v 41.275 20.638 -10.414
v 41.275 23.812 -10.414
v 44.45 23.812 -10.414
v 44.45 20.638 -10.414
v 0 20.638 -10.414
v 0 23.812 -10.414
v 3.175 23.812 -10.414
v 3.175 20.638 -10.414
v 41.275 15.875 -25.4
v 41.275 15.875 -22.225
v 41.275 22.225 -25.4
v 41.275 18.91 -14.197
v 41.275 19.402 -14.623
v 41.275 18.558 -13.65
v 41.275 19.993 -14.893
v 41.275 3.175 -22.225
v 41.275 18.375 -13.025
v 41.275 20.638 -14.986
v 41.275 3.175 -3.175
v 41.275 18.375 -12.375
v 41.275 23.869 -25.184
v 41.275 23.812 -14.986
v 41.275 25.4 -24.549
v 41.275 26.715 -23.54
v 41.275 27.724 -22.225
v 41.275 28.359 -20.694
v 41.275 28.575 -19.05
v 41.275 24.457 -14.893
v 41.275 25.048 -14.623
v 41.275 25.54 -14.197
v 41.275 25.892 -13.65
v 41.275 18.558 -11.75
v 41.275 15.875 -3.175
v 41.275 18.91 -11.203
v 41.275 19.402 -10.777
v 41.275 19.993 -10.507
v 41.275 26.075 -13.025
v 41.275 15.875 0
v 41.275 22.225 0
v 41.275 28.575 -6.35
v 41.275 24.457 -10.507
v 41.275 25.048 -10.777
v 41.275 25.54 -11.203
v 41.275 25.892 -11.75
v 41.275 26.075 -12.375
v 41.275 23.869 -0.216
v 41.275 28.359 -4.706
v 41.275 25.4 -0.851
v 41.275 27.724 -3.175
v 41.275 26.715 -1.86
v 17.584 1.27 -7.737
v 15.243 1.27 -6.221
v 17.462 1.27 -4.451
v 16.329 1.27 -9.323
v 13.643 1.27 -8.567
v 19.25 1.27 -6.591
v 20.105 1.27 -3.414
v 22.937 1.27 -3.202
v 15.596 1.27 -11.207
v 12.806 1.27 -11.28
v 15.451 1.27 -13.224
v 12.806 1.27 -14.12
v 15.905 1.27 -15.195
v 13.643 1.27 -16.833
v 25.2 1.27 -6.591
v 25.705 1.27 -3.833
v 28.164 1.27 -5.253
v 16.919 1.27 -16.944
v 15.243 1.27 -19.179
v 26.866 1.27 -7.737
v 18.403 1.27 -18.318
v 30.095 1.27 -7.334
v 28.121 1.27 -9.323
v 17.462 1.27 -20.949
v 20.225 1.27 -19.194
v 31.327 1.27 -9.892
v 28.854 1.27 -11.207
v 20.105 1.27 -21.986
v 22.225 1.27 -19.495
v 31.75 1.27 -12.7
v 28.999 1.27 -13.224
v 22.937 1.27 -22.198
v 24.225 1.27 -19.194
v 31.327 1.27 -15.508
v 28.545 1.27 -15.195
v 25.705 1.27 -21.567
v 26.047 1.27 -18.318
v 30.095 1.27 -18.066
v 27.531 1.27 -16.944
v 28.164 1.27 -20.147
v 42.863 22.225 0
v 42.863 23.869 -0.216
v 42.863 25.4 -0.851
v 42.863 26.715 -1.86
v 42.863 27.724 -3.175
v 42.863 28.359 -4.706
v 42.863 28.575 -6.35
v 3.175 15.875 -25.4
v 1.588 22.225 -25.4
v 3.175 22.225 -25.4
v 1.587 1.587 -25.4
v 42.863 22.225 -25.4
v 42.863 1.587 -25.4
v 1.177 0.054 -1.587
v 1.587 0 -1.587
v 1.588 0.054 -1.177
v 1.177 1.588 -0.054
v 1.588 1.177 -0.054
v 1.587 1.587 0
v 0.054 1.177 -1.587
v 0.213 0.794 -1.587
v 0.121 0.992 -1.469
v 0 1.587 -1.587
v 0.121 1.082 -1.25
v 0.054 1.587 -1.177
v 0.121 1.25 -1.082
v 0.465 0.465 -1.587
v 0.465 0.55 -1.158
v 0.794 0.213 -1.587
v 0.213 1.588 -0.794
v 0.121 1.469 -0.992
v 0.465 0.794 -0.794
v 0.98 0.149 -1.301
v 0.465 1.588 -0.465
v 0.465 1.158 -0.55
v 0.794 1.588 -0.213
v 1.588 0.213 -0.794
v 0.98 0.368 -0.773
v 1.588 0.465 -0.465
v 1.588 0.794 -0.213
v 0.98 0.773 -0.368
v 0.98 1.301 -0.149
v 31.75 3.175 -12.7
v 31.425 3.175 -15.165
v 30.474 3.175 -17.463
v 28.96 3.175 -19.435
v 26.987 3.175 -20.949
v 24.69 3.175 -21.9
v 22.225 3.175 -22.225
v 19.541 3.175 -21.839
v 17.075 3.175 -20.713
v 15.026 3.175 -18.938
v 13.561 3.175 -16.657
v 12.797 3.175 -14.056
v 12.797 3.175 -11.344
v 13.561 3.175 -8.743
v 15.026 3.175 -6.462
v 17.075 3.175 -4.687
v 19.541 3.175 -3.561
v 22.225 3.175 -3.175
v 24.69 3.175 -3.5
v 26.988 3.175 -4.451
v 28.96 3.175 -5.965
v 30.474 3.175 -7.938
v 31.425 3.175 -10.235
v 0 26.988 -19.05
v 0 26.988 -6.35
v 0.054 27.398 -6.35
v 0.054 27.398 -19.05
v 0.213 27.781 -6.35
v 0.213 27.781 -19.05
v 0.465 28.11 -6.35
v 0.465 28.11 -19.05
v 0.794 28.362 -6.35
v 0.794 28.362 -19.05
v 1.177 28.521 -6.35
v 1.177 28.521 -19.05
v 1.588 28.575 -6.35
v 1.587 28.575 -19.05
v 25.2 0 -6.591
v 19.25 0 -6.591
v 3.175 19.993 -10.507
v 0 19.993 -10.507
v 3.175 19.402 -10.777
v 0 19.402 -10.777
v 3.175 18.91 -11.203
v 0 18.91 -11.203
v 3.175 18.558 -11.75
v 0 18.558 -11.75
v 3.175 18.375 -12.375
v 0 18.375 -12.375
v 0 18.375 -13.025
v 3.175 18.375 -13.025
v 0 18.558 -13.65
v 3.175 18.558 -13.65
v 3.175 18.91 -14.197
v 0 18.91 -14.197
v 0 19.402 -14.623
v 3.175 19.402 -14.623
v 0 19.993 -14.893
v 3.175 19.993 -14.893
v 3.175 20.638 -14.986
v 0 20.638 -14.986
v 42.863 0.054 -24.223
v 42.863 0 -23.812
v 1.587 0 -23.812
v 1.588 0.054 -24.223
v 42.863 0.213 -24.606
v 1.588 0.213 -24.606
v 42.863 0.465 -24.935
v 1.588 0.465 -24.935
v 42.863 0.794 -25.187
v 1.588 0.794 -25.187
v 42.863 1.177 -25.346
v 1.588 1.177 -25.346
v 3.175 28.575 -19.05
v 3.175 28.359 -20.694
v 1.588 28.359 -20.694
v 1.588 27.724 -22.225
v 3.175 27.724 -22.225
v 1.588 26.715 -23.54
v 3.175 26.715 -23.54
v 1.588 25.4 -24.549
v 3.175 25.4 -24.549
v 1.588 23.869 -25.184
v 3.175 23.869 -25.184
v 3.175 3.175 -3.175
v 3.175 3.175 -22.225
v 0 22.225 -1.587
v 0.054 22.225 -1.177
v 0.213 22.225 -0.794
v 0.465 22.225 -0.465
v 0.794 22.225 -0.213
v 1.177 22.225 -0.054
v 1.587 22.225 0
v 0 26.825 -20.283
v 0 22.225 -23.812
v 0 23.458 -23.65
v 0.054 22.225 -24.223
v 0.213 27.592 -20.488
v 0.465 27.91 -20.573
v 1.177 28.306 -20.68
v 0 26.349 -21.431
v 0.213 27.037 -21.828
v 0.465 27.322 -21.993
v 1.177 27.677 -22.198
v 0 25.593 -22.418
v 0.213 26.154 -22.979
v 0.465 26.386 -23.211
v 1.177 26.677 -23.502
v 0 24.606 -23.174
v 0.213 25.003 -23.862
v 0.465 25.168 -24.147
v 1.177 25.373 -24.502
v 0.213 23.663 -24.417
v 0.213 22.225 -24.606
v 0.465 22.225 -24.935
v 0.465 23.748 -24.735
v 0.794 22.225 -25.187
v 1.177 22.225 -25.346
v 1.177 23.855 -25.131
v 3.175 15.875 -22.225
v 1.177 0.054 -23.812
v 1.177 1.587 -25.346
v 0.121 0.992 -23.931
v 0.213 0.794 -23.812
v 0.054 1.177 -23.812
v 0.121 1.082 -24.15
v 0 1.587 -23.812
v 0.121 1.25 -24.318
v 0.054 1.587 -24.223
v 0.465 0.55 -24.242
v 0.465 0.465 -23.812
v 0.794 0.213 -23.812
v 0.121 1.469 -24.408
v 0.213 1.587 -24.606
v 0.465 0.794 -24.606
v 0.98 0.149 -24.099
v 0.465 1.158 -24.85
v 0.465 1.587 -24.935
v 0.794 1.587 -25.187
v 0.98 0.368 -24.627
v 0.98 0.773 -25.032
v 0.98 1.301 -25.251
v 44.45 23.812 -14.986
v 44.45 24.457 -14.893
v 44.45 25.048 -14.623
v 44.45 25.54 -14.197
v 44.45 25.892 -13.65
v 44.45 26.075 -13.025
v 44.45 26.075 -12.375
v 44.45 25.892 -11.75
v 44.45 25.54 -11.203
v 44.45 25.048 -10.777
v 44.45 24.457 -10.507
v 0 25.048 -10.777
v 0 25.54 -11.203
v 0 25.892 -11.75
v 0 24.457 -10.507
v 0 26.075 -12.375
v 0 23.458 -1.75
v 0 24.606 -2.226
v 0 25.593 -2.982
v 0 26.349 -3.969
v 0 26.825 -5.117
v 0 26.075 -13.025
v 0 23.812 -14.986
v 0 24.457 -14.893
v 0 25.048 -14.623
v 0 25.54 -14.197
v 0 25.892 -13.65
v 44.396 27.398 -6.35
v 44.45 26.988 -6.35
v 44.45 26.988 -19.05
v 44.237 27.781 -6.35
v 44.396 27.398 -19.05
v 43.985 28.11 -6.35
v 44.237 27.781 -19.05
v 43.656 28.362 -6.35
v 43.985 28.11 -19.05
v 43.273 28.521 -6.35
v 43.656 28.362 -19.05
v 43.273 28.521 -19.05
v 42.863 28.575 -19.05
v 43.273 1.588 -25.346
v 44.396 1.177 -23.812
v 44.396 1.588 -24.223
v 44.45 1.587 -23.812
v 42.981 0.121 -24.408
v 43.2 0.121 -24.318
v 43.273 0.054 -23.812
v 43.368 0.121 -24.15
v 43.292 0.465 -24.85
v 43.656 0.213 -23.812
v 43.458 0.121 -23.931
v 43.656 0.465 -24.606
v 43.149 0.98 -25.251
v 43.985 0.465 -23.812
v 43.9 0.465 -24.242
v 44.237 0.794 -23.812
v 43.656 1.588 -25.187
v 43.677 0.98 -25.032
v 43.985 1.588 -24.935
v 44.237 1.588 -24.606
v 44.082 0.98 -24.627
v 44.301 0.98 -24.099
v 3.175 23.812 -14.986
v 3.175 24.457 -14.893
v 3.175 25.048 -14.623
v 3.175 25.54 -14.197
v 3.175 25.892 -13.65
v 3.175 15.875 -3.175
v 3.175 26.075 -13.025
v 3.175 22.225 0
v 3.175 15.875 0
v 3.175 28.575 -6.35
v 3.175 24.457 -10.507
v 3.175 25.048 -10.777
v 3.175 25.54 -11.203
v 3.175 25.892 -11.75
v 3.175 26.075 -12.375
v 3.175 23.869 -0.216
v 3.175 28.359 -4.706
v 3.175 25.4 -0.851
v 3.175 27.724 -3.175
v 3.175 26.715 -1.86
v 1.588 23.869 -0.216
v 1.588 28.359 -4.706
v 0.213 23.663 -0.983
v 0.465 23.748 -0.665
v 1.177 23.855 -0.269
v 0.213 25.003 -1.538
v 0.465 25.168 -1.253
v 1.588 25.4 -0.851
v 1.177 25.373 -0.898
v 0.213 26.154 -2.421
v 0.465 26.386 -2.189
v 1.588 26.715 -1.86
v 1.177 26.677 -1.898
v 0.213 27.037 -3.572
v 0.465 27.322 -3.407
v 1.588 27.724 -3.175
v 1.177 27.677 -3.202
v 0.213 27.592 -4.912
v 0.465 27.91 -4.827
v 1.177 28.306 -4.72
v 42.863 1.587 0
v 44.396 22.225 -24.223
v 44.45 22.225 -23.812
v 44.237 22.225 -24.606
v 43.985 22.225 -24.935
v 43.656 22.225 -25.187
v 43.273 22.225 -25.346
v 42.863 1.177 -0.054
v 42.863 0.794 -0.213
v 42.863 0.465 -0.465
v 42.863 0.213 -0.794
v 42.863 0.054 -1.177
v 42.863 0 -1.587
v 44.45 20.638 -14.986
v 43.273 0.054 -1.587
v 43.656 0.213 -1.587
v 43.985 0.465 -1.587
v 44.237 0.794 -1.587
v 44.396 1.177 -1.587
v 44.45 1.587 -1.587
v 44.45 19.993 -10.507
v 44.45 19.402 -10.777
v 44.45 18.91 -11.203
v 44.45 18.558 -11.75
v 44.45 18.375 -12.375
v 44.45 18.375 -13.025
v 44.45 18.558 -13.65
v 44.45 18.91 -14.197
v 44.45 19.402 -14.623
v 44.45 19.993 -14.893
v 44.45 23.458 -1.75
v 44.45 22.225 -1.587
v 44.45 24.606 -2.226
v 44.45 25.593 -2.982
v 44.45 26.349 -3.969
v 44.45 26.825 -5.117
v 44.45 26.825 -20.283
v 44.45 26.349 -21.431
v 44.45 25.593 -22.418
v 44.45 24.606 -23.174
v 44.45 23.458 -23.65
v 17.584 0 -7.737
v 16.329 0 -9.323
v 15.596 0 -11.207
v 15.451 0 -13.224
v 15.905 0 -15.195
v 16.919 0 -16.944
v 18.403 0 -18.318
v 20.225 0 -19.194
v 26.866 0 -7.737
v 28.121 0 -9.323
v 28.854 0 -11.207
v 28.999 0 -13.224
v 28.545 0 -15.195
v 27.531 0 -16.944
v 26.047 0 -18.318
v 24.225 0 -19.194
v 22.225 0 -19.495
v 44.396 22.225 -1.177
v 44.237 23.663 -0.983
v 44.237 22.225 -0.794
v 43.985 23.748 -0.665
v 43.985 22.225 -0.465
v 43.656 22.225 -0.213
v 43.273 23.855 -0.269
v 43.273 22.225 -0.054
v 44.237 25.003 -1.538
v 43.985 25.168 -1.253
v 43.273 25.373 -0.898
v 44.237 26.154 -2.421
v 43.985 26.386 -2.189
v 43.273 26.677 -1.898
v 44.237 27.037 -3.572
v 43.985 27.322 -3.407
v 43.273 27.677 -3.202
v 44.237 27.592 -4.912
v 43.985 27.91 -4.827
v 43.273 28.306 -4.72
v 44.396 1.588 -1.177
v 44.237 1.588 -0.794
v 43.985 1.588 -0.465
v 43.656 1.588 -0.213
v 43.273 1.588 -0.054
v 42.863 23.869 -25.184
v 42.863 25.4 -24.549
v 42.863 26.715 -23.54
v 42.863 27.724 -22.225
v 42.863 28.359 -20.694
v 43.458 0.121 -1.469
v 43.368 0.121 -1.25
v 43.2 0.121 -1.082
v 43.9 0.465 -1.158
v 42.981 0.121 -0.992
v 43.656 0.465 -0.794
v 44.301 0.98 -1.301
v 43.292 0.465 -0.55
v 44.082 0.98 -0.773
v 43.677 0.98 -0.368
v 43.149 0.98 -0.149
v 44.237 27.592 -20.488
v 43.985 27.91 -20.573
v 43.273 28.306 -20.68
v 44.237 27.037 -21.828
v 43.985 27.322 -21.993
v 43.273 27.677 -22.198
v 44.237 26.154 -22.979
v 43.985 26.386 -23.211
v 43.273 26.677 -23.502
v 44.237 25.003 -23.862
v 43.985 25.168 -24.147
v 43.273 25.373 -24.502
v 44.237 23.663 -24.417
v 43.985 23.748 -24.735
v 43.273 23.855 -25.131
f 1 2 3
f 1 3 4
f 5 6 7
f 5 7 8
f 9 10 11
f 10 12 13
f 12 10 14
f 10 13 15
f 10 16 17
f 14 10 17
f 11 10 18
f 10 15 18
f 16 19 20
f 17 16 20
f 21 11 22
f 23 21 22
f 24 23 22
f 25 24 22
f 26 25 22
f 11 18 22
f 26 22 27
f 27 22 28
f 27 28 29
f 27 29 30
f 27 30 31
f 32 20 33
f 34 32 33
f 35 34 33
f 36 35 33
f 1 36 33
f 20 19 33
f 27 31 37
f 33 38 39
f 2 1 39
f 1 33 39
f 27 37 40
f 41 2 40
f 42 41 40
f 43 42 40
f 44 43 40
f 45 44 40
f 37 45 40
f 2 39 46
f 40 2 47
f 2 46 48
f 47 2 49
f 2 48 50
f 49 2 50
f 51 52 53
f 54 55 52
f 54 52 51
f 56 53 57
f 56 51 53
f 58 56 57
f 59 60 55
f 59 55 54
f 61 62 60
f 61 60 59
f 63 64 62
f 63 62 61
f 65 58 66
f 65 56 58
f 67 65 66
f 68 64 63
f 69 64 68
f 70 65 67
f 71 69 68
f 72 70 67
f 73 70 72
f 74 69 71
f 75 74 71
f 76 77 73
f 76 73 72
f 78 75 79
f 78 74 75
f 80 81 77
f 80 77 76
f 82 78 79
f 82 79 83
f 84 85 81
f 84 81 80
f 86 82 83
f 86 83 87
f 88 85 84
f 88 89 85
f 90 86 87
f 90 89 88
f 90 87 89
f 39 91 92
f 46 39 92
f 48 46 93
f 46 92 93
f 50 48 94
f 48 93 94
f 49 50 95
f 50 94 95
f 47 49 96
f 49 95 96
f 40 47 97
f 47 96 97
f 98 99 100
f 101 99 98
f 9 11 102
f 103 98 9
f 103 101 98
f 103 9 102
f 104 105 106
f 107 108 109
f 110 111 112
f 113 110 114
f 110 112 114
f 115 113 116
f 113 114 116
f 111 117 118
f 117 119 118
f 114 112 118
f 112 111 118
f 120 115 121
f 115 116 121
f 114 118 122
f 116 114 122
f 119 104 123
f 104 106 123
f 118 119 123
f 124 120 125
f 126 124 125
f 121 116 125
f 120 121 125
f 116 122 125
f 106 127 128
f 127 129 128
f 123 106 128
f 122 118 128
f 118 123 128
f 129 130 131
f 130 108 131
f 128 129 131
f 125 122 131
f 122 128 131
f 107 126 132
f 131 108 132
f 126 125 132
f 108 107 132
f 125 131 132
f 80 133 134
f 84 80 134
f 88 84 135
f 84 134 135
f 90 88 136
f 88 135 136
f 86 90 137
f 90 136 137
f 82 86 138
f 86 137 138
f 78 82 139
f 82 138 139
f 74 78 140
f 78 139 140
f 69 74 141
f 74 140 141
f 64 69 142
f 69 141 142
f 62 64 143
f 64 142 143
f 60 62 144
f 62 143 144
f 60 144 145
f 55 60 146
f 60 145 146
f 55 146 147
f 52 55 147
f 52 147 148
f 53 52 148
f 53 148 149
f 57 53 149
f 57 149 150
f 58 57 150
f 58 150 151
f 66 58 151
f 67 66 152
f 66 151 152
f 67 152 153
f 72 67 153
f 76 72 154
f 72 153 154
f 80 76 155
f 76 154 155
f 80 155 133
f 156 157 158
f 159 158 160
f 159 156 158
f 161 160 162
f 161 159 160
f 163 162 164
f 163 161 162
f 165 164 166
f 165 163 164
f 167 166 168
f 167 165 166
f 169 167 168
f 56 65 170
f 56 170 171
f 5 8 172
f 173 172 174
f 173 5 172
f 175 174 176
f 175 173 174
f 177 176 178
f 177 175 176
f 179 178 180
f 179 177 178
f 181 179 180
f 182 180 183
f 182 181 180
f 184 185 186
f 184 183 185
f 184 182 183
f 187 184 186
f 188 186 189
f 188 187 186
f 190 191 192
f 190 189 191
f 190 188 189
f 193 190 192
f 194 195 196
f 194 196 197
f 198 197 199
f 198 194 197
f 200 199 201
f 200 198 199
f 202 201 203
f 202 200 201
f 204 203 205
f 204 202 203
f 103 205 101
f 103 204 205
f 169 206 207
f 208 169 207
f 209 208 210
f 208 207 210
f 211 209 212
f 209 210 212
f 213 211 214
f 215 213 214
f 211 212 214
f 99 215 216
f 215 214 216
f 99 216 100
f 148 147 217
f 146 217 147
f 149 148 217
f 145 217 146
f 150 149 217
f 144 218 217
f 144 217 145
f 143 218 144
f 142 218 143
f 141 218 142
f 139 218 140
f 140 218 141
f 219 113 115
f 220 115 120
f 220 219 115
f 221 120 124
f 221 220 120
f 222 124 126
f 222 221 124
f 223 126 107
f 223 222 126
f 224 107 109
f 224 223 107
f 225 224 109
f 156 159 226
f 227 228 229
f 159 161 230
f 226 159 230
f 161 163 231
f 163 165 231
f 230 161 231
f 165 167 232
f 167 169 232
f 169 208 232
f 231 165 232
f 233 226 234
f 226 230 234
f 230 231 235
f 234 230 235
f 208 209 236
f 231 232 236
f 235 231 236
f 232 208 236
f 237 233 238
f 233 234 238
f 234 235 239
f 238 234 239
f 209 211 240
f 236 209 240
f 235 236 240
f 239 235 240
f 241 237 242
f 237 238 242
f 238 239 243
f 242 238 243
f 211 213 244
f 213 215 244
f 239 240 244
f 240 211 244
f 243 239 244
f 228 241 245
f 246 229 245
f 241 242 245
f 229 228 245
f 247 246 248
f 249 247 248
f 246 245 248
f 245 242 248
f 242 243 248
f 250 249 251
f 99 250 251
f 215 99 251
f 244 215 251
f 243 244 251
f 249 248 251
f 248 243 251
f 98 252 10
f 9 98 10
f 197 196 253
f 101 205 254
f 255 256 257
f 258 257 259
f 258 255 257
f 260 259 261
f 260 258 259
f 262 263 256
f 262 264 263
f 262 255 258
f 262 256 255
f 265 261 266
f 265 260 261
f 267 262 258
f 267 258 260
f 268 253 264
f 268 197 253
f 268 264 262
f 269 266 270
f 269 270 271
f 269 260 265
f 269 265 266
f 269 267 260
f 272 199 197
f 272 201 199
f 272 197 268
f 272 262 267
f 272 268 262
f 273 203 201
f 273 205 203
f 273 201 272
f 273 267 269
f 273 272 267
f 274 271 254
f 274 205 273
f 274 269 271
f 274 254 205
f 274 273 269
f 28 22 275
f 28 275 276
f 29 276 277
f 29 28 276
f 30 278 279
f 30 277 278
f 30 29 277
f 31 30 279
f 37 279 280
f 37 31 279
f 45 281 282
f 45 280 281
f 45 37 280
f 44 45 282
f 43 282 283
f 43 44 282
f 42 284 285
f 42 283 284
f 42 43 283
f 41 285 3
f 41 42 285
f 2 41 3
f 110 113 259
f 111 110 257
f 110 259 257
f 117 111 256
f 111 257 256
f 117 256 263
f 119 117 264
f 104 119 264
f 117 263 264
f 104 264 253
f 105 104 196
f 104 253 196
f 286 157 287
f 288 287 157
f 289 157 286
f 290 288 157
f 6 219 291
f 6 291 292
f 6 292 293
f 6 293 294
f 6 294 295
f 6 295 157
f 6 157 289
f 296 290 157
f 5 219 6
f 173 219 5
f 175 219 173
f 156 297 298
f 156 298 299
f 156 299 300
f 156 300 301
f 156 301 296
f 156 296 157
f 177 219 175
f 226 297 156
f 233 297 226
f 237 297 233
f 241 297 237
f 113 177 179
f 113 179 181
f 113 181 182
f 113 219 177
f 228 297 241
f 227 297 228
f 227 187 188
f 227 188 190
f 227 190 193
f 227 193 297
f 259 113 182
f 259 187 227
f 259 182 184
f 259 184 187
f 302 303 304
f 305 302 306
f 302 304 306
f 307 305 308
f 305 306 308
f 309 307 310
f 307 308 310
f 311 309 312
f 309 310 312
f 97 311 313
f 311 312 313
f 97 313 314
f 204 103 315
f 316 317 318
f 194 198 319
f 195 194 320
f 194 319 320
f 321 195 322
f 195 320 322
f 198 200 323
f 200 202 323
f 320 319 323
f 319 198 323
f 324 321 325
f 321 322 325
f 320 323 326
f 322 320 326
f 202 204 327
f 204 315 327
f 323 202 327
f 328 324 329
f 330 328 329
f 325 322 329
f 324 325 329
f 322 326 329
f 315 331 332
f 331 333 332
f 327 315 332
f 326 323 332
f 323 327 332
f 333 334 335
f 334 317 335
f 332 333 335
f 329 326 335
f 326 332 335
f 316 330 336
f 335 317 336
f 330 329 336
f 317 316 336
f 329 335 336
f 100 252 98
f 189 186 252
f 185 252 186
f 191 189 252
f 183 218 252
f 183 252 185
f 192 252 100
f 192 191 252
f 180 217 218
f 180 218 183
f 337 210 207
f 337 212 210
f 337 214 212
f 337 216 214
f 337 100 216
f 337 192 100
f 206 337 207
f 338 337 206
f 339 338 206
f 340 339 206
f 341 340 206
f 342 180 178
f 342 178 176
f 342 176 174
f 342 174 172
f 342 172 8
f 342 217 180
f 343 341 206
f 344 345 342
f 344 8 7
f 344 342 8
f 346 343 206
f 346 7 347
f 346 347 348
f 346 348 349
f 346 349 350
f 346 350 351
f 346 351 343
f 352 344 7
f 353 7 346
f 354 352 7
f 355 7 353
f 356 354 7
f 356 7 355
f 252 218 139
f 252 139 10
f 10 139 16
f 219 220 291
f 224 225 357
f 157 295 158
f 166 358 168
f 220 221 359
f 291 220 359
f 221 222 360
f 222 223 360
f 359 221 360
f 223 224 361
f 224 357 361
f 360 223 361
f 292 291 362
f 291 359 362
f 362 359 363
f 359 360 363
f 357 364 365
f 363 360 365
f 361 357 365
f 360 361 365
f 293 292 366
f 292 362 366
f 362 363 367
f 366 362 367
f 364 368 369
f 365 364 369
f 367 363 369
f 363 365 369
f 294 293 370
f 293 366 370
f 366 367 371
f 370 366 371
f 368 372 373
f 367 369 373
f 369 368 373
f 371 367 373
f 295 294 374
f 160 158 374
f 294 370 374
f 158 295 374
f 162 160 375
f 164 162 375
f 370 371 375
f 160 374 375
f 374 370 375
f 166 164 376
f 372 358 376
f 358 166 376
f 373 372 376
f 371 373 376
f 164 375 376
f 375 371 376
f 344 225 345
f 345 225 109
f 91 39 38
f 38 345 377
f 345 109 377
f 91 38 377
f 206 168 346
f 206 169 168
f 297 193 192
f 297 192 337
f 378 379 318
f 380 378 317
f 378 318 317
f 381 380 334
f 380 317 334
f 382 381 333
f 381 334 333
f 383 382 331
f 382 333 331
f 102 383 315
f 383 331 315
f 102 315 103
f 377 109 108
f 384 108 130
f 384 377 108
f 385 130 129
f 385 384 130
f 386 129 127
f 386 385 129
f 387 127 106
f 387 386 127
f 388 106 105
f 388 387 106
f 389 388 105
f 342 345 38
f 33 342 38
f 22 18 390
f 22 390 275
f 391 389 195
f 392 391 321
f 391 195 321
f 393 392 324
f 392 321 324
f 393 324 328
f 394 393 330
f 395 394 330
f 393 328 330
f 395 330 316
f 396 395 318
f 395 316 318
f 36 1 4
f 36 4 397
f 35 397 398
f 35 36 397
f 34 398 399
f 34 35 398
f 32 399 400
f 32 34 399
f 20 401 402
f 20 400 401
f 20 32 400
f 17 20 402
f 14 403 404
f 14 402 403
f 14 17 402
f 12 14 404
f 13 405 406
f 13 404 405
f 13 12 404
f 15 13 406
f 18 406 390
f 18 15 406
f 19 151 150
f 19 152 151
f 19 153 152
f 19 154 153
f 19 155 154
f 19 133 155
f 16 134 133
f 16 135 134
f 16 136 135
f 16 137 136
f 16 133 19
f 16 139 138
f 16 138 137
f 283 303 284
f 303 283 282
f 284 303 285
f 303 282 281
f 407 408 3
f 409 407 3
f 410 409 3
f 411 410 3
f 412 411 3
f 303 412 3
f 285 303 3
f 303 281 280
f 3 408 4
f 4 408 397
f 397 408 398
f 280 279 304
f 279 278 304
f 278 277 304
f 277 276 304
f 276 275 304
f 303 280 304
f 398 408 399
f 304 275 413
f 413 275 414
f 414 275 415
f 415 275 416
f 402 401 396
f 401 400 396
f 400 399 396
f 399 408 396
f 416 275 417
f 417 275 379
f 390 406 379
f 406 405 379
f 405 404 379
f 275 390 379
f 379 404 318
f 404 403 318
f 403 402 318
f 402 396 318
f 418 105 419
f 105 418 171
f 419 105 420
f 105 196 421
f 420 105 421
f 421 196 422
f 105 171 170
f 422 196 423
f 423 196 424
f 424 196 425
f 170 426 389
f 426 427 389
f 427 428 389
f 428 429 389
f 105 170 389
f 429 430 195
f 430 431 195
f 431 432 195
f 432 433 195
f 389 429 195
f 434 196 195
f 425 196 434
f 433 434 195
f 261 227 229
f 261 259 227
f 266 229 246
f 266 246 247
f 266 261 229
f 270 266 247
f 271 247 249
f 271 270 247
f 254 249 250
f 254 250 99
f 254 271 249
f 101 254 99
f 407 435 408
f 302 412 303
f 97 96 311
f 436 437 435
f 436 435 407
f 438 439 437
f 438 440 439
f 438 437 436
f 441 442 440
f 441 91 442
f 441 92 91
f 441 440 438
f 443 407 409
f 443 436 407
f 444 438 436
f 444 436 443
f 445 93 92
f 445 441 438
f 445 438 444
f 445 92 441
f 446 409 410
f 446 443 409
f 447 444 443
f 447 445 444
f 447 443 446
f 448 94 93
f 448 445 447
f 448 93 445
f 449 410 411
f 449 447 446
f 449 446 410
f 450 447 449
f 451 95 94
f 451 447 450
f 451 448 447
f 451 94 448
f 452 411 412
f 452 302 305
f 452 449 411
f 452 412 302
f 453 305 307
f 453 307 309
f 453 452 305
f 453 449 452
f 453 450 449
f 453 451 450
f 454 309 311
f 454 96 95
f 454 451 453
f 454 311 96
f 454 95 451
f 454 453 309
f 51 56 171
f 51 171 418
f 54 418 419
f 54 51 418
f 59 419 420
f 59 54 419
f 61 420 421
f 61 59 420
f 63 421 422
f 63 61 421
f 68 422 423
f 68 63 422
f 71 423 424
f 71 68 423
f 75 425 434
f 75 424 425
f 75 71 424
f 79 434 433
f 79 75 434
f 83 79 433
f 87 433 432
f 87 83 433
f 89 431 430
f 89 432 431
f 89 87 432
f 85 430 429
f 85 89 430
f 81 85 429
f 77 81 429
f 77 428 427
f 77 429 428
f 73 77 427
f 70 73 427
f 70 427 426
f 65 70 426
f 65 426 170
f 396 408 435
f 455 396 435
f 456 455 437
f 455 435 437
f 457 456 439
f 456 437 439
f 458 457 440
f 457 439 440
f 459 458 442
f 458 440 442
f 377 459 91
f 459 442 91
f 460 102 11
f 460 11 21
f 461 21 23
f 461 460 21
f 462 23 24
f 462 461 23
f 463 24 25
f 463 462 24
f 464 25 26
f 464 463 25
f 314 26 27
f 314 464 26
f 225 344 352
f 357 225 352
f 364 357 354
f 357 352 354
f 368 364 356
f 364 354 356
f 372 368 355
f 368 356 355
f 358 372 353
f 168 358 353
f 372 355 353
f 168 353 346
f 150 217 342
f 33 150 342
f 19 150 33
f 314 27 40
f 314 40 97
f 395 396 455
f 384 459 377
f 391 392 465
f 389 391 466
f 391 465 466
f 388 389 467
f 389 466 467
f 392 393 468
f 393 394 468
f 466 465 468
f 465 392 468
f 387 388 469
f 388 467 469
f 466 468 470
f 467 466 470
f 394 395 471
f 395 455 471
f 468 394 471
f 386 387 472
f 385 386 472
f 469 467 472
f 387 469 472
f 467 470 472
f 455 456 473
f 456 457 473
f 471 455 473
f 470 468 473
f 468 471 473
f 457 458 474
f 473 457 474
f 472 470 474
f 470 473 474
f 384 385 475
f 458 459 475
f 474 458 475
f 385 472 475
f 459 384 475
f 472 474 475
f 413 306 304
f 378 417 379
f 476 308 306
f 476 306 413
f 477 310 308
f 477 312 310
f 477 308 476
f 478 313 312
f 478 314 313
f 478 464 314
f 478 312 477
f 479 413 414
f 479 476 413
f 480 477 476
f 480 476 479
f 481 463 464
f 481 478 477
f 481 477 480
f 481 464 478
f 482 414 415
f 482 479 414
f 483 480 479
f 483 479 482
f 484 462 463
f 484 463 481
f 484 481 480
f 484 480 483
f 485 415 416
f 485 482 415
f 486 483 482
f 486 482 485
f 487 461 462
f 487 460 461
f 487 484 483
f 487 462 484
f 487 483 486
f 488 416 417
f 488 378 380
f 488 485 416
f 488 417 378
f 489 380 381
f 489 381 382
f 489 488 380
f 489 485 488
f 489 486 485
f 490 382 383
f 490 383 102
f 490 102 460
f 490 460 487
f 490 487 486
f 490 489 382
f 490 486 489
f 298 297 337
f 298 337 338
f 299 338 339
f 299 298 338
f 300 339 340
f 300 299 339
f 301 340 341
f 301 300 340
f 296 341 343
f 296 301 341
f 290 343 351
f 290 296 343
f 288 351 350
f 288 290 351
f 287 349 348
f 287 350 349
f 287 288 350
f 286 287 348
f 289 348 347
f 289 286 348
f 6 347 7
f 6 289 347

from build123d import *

# Parameters (mm, degrees)
SKETCH1_W           = 44.45
SKETCH1_H           = 25.4
BOSS_EXTRUDE1_DEPTH = 28.575
SHELL1_T            = -3.175
SKETCH2_W           = 38.1
SKETCH2_H           = 12.7
CUT_EXTRUDE1_DEPTH  = 26.4
CUT_EXTRUDE2_DEPTH  = 45.45
CUT_EXTRUDE3_DEPTH  = 4.175
FILLET1_R           = 6.35
FILLET2_R           = 1.5875
SKETCH6_R           = 9.525
CUT_EXTRUDE4_DEPTH  = 1.905


with BuildPart() as part:
    # Sketch1 → Boss-Extrude1 (new body)
    with BuildSketch(Plane(origin=(0, 0, 0), x_dir=(1, 0, 0), z_dir=(0, 1, 0))):
        with Locations((22.225, 12.7)):
            Rectangle(SKETCH1_W, SKETCH1_H)
    extrude(amount=BOSS_EXTRUDE1_DEPTH)

    # Shell1
    shell1_openings = [part.faces().sort_by_distance(p)[0] for p in [
        (22.225, 28.575, -12.7),
    ]]
    offset(amount=SHELL1_T, openings=shell1_openings, kind=Kind.INTERSECTION)

    # Sketch2 → Cut-Extrude1 (cut, through all)
    with BuildSketch(Plane.XY):
        with Locations((22.225, 22.225)):
            Rectangle(SKETCH2_W, SKETCH2_H)
    extrude(amount=-CUT_EXTRUDE1_DEPTH, mode=Mode.SUBTRACT)

    # Sketch3 → Cut-Extrude2 (cut, through all)
    with BuildSketch(Plane.ZY):
        with BuildLine():
            Line((-10.414, 23.8125), (-10.414, 20.6375))
            ThreePointArc((-10.414, 20.6375), (-12.7, 18.3515), (-14.986, 20.6375))
            Line((-14.986, 20.6375), (-14.986, 23.8125))
            ThreePointArc((-14.986, 23.8125), (-12.7, 26.0985), (-10.414, 23.8125))
        make_face()
    extrude(amount=-CUT_EXTRUDE2_DEPTH, mode=Mode.SUBTRACT)

    # Sketch5 → Cut-Extrude3 (cut, through all)
    with BuildSketch(Plane(origin=(0, 3.175, 0), x_dir=(1, 0, 0), z_dir=(0, 1, 0))):
        with BuildLine():
            Line((25.199729326, 6.5913), (19.250270674, 6.5913))
            ThreePointArc((19.250270674, 6.5913), (22.225, 19.4945), (25.199729326, 6.5913))
        make_face()
    extrude(amount=-CUT_EXTRUDE3_DEPTH, mode=Mode.SUBTRACT)

    # Fillet1
    fillet1_edges = [part.edges().sort_by_distance(p)[0] for p in [
        (42.8625, 28.575, -25.4),
        (1.5875, 28.575, -25.4),
        (42.8625, 28.575, 0),
        (1.5875, 28.575, 0),
    ]]
    fillet(fillet1_edges, radius=FILLET1_R)

    # Fillet2
    fillet2_edges = [part.edges().sort_by_distance(p)[0] for p in [
        (44.45, 26.715128061, -1.859871939),
        (44.45, 26.715128061, -23.540128061),
        (22.225, 0, -25.4),
        (44.45, 0, -12.7),
        (22.225, 0, 0),
        (0, 0, -12.7),
        (0, 28.575, -12.7),
        (0, 11.1125, 0),
        (0, 11.1125, -25.4),
        (0, 26.715128061, -1.859871939),
        (0, 26.715128061, -23.540128061),
        (44.45, 11.1125, -25.4),
        (44.45, 11.1125, 0),
        (44.45, 28.575, -12.7),
    ]]
    fillet(fillet2_edges, radius=FILLET2_R)

    # Sketch6 → Cut-Extrude4 (cut)
    with BuildSketch(Plane(origin=(0, 3.175, 0), x_dir=(1, 0, 0), z_dir=(0, 1, 0))):
        with Locations((22.225, 12.7)):
            Circle(SKETCH6_R)
    extrude(amount=-CUT_EXTRUDE4_DEPTH, mode=Mode.SUBTRACT)


solid = part.part
